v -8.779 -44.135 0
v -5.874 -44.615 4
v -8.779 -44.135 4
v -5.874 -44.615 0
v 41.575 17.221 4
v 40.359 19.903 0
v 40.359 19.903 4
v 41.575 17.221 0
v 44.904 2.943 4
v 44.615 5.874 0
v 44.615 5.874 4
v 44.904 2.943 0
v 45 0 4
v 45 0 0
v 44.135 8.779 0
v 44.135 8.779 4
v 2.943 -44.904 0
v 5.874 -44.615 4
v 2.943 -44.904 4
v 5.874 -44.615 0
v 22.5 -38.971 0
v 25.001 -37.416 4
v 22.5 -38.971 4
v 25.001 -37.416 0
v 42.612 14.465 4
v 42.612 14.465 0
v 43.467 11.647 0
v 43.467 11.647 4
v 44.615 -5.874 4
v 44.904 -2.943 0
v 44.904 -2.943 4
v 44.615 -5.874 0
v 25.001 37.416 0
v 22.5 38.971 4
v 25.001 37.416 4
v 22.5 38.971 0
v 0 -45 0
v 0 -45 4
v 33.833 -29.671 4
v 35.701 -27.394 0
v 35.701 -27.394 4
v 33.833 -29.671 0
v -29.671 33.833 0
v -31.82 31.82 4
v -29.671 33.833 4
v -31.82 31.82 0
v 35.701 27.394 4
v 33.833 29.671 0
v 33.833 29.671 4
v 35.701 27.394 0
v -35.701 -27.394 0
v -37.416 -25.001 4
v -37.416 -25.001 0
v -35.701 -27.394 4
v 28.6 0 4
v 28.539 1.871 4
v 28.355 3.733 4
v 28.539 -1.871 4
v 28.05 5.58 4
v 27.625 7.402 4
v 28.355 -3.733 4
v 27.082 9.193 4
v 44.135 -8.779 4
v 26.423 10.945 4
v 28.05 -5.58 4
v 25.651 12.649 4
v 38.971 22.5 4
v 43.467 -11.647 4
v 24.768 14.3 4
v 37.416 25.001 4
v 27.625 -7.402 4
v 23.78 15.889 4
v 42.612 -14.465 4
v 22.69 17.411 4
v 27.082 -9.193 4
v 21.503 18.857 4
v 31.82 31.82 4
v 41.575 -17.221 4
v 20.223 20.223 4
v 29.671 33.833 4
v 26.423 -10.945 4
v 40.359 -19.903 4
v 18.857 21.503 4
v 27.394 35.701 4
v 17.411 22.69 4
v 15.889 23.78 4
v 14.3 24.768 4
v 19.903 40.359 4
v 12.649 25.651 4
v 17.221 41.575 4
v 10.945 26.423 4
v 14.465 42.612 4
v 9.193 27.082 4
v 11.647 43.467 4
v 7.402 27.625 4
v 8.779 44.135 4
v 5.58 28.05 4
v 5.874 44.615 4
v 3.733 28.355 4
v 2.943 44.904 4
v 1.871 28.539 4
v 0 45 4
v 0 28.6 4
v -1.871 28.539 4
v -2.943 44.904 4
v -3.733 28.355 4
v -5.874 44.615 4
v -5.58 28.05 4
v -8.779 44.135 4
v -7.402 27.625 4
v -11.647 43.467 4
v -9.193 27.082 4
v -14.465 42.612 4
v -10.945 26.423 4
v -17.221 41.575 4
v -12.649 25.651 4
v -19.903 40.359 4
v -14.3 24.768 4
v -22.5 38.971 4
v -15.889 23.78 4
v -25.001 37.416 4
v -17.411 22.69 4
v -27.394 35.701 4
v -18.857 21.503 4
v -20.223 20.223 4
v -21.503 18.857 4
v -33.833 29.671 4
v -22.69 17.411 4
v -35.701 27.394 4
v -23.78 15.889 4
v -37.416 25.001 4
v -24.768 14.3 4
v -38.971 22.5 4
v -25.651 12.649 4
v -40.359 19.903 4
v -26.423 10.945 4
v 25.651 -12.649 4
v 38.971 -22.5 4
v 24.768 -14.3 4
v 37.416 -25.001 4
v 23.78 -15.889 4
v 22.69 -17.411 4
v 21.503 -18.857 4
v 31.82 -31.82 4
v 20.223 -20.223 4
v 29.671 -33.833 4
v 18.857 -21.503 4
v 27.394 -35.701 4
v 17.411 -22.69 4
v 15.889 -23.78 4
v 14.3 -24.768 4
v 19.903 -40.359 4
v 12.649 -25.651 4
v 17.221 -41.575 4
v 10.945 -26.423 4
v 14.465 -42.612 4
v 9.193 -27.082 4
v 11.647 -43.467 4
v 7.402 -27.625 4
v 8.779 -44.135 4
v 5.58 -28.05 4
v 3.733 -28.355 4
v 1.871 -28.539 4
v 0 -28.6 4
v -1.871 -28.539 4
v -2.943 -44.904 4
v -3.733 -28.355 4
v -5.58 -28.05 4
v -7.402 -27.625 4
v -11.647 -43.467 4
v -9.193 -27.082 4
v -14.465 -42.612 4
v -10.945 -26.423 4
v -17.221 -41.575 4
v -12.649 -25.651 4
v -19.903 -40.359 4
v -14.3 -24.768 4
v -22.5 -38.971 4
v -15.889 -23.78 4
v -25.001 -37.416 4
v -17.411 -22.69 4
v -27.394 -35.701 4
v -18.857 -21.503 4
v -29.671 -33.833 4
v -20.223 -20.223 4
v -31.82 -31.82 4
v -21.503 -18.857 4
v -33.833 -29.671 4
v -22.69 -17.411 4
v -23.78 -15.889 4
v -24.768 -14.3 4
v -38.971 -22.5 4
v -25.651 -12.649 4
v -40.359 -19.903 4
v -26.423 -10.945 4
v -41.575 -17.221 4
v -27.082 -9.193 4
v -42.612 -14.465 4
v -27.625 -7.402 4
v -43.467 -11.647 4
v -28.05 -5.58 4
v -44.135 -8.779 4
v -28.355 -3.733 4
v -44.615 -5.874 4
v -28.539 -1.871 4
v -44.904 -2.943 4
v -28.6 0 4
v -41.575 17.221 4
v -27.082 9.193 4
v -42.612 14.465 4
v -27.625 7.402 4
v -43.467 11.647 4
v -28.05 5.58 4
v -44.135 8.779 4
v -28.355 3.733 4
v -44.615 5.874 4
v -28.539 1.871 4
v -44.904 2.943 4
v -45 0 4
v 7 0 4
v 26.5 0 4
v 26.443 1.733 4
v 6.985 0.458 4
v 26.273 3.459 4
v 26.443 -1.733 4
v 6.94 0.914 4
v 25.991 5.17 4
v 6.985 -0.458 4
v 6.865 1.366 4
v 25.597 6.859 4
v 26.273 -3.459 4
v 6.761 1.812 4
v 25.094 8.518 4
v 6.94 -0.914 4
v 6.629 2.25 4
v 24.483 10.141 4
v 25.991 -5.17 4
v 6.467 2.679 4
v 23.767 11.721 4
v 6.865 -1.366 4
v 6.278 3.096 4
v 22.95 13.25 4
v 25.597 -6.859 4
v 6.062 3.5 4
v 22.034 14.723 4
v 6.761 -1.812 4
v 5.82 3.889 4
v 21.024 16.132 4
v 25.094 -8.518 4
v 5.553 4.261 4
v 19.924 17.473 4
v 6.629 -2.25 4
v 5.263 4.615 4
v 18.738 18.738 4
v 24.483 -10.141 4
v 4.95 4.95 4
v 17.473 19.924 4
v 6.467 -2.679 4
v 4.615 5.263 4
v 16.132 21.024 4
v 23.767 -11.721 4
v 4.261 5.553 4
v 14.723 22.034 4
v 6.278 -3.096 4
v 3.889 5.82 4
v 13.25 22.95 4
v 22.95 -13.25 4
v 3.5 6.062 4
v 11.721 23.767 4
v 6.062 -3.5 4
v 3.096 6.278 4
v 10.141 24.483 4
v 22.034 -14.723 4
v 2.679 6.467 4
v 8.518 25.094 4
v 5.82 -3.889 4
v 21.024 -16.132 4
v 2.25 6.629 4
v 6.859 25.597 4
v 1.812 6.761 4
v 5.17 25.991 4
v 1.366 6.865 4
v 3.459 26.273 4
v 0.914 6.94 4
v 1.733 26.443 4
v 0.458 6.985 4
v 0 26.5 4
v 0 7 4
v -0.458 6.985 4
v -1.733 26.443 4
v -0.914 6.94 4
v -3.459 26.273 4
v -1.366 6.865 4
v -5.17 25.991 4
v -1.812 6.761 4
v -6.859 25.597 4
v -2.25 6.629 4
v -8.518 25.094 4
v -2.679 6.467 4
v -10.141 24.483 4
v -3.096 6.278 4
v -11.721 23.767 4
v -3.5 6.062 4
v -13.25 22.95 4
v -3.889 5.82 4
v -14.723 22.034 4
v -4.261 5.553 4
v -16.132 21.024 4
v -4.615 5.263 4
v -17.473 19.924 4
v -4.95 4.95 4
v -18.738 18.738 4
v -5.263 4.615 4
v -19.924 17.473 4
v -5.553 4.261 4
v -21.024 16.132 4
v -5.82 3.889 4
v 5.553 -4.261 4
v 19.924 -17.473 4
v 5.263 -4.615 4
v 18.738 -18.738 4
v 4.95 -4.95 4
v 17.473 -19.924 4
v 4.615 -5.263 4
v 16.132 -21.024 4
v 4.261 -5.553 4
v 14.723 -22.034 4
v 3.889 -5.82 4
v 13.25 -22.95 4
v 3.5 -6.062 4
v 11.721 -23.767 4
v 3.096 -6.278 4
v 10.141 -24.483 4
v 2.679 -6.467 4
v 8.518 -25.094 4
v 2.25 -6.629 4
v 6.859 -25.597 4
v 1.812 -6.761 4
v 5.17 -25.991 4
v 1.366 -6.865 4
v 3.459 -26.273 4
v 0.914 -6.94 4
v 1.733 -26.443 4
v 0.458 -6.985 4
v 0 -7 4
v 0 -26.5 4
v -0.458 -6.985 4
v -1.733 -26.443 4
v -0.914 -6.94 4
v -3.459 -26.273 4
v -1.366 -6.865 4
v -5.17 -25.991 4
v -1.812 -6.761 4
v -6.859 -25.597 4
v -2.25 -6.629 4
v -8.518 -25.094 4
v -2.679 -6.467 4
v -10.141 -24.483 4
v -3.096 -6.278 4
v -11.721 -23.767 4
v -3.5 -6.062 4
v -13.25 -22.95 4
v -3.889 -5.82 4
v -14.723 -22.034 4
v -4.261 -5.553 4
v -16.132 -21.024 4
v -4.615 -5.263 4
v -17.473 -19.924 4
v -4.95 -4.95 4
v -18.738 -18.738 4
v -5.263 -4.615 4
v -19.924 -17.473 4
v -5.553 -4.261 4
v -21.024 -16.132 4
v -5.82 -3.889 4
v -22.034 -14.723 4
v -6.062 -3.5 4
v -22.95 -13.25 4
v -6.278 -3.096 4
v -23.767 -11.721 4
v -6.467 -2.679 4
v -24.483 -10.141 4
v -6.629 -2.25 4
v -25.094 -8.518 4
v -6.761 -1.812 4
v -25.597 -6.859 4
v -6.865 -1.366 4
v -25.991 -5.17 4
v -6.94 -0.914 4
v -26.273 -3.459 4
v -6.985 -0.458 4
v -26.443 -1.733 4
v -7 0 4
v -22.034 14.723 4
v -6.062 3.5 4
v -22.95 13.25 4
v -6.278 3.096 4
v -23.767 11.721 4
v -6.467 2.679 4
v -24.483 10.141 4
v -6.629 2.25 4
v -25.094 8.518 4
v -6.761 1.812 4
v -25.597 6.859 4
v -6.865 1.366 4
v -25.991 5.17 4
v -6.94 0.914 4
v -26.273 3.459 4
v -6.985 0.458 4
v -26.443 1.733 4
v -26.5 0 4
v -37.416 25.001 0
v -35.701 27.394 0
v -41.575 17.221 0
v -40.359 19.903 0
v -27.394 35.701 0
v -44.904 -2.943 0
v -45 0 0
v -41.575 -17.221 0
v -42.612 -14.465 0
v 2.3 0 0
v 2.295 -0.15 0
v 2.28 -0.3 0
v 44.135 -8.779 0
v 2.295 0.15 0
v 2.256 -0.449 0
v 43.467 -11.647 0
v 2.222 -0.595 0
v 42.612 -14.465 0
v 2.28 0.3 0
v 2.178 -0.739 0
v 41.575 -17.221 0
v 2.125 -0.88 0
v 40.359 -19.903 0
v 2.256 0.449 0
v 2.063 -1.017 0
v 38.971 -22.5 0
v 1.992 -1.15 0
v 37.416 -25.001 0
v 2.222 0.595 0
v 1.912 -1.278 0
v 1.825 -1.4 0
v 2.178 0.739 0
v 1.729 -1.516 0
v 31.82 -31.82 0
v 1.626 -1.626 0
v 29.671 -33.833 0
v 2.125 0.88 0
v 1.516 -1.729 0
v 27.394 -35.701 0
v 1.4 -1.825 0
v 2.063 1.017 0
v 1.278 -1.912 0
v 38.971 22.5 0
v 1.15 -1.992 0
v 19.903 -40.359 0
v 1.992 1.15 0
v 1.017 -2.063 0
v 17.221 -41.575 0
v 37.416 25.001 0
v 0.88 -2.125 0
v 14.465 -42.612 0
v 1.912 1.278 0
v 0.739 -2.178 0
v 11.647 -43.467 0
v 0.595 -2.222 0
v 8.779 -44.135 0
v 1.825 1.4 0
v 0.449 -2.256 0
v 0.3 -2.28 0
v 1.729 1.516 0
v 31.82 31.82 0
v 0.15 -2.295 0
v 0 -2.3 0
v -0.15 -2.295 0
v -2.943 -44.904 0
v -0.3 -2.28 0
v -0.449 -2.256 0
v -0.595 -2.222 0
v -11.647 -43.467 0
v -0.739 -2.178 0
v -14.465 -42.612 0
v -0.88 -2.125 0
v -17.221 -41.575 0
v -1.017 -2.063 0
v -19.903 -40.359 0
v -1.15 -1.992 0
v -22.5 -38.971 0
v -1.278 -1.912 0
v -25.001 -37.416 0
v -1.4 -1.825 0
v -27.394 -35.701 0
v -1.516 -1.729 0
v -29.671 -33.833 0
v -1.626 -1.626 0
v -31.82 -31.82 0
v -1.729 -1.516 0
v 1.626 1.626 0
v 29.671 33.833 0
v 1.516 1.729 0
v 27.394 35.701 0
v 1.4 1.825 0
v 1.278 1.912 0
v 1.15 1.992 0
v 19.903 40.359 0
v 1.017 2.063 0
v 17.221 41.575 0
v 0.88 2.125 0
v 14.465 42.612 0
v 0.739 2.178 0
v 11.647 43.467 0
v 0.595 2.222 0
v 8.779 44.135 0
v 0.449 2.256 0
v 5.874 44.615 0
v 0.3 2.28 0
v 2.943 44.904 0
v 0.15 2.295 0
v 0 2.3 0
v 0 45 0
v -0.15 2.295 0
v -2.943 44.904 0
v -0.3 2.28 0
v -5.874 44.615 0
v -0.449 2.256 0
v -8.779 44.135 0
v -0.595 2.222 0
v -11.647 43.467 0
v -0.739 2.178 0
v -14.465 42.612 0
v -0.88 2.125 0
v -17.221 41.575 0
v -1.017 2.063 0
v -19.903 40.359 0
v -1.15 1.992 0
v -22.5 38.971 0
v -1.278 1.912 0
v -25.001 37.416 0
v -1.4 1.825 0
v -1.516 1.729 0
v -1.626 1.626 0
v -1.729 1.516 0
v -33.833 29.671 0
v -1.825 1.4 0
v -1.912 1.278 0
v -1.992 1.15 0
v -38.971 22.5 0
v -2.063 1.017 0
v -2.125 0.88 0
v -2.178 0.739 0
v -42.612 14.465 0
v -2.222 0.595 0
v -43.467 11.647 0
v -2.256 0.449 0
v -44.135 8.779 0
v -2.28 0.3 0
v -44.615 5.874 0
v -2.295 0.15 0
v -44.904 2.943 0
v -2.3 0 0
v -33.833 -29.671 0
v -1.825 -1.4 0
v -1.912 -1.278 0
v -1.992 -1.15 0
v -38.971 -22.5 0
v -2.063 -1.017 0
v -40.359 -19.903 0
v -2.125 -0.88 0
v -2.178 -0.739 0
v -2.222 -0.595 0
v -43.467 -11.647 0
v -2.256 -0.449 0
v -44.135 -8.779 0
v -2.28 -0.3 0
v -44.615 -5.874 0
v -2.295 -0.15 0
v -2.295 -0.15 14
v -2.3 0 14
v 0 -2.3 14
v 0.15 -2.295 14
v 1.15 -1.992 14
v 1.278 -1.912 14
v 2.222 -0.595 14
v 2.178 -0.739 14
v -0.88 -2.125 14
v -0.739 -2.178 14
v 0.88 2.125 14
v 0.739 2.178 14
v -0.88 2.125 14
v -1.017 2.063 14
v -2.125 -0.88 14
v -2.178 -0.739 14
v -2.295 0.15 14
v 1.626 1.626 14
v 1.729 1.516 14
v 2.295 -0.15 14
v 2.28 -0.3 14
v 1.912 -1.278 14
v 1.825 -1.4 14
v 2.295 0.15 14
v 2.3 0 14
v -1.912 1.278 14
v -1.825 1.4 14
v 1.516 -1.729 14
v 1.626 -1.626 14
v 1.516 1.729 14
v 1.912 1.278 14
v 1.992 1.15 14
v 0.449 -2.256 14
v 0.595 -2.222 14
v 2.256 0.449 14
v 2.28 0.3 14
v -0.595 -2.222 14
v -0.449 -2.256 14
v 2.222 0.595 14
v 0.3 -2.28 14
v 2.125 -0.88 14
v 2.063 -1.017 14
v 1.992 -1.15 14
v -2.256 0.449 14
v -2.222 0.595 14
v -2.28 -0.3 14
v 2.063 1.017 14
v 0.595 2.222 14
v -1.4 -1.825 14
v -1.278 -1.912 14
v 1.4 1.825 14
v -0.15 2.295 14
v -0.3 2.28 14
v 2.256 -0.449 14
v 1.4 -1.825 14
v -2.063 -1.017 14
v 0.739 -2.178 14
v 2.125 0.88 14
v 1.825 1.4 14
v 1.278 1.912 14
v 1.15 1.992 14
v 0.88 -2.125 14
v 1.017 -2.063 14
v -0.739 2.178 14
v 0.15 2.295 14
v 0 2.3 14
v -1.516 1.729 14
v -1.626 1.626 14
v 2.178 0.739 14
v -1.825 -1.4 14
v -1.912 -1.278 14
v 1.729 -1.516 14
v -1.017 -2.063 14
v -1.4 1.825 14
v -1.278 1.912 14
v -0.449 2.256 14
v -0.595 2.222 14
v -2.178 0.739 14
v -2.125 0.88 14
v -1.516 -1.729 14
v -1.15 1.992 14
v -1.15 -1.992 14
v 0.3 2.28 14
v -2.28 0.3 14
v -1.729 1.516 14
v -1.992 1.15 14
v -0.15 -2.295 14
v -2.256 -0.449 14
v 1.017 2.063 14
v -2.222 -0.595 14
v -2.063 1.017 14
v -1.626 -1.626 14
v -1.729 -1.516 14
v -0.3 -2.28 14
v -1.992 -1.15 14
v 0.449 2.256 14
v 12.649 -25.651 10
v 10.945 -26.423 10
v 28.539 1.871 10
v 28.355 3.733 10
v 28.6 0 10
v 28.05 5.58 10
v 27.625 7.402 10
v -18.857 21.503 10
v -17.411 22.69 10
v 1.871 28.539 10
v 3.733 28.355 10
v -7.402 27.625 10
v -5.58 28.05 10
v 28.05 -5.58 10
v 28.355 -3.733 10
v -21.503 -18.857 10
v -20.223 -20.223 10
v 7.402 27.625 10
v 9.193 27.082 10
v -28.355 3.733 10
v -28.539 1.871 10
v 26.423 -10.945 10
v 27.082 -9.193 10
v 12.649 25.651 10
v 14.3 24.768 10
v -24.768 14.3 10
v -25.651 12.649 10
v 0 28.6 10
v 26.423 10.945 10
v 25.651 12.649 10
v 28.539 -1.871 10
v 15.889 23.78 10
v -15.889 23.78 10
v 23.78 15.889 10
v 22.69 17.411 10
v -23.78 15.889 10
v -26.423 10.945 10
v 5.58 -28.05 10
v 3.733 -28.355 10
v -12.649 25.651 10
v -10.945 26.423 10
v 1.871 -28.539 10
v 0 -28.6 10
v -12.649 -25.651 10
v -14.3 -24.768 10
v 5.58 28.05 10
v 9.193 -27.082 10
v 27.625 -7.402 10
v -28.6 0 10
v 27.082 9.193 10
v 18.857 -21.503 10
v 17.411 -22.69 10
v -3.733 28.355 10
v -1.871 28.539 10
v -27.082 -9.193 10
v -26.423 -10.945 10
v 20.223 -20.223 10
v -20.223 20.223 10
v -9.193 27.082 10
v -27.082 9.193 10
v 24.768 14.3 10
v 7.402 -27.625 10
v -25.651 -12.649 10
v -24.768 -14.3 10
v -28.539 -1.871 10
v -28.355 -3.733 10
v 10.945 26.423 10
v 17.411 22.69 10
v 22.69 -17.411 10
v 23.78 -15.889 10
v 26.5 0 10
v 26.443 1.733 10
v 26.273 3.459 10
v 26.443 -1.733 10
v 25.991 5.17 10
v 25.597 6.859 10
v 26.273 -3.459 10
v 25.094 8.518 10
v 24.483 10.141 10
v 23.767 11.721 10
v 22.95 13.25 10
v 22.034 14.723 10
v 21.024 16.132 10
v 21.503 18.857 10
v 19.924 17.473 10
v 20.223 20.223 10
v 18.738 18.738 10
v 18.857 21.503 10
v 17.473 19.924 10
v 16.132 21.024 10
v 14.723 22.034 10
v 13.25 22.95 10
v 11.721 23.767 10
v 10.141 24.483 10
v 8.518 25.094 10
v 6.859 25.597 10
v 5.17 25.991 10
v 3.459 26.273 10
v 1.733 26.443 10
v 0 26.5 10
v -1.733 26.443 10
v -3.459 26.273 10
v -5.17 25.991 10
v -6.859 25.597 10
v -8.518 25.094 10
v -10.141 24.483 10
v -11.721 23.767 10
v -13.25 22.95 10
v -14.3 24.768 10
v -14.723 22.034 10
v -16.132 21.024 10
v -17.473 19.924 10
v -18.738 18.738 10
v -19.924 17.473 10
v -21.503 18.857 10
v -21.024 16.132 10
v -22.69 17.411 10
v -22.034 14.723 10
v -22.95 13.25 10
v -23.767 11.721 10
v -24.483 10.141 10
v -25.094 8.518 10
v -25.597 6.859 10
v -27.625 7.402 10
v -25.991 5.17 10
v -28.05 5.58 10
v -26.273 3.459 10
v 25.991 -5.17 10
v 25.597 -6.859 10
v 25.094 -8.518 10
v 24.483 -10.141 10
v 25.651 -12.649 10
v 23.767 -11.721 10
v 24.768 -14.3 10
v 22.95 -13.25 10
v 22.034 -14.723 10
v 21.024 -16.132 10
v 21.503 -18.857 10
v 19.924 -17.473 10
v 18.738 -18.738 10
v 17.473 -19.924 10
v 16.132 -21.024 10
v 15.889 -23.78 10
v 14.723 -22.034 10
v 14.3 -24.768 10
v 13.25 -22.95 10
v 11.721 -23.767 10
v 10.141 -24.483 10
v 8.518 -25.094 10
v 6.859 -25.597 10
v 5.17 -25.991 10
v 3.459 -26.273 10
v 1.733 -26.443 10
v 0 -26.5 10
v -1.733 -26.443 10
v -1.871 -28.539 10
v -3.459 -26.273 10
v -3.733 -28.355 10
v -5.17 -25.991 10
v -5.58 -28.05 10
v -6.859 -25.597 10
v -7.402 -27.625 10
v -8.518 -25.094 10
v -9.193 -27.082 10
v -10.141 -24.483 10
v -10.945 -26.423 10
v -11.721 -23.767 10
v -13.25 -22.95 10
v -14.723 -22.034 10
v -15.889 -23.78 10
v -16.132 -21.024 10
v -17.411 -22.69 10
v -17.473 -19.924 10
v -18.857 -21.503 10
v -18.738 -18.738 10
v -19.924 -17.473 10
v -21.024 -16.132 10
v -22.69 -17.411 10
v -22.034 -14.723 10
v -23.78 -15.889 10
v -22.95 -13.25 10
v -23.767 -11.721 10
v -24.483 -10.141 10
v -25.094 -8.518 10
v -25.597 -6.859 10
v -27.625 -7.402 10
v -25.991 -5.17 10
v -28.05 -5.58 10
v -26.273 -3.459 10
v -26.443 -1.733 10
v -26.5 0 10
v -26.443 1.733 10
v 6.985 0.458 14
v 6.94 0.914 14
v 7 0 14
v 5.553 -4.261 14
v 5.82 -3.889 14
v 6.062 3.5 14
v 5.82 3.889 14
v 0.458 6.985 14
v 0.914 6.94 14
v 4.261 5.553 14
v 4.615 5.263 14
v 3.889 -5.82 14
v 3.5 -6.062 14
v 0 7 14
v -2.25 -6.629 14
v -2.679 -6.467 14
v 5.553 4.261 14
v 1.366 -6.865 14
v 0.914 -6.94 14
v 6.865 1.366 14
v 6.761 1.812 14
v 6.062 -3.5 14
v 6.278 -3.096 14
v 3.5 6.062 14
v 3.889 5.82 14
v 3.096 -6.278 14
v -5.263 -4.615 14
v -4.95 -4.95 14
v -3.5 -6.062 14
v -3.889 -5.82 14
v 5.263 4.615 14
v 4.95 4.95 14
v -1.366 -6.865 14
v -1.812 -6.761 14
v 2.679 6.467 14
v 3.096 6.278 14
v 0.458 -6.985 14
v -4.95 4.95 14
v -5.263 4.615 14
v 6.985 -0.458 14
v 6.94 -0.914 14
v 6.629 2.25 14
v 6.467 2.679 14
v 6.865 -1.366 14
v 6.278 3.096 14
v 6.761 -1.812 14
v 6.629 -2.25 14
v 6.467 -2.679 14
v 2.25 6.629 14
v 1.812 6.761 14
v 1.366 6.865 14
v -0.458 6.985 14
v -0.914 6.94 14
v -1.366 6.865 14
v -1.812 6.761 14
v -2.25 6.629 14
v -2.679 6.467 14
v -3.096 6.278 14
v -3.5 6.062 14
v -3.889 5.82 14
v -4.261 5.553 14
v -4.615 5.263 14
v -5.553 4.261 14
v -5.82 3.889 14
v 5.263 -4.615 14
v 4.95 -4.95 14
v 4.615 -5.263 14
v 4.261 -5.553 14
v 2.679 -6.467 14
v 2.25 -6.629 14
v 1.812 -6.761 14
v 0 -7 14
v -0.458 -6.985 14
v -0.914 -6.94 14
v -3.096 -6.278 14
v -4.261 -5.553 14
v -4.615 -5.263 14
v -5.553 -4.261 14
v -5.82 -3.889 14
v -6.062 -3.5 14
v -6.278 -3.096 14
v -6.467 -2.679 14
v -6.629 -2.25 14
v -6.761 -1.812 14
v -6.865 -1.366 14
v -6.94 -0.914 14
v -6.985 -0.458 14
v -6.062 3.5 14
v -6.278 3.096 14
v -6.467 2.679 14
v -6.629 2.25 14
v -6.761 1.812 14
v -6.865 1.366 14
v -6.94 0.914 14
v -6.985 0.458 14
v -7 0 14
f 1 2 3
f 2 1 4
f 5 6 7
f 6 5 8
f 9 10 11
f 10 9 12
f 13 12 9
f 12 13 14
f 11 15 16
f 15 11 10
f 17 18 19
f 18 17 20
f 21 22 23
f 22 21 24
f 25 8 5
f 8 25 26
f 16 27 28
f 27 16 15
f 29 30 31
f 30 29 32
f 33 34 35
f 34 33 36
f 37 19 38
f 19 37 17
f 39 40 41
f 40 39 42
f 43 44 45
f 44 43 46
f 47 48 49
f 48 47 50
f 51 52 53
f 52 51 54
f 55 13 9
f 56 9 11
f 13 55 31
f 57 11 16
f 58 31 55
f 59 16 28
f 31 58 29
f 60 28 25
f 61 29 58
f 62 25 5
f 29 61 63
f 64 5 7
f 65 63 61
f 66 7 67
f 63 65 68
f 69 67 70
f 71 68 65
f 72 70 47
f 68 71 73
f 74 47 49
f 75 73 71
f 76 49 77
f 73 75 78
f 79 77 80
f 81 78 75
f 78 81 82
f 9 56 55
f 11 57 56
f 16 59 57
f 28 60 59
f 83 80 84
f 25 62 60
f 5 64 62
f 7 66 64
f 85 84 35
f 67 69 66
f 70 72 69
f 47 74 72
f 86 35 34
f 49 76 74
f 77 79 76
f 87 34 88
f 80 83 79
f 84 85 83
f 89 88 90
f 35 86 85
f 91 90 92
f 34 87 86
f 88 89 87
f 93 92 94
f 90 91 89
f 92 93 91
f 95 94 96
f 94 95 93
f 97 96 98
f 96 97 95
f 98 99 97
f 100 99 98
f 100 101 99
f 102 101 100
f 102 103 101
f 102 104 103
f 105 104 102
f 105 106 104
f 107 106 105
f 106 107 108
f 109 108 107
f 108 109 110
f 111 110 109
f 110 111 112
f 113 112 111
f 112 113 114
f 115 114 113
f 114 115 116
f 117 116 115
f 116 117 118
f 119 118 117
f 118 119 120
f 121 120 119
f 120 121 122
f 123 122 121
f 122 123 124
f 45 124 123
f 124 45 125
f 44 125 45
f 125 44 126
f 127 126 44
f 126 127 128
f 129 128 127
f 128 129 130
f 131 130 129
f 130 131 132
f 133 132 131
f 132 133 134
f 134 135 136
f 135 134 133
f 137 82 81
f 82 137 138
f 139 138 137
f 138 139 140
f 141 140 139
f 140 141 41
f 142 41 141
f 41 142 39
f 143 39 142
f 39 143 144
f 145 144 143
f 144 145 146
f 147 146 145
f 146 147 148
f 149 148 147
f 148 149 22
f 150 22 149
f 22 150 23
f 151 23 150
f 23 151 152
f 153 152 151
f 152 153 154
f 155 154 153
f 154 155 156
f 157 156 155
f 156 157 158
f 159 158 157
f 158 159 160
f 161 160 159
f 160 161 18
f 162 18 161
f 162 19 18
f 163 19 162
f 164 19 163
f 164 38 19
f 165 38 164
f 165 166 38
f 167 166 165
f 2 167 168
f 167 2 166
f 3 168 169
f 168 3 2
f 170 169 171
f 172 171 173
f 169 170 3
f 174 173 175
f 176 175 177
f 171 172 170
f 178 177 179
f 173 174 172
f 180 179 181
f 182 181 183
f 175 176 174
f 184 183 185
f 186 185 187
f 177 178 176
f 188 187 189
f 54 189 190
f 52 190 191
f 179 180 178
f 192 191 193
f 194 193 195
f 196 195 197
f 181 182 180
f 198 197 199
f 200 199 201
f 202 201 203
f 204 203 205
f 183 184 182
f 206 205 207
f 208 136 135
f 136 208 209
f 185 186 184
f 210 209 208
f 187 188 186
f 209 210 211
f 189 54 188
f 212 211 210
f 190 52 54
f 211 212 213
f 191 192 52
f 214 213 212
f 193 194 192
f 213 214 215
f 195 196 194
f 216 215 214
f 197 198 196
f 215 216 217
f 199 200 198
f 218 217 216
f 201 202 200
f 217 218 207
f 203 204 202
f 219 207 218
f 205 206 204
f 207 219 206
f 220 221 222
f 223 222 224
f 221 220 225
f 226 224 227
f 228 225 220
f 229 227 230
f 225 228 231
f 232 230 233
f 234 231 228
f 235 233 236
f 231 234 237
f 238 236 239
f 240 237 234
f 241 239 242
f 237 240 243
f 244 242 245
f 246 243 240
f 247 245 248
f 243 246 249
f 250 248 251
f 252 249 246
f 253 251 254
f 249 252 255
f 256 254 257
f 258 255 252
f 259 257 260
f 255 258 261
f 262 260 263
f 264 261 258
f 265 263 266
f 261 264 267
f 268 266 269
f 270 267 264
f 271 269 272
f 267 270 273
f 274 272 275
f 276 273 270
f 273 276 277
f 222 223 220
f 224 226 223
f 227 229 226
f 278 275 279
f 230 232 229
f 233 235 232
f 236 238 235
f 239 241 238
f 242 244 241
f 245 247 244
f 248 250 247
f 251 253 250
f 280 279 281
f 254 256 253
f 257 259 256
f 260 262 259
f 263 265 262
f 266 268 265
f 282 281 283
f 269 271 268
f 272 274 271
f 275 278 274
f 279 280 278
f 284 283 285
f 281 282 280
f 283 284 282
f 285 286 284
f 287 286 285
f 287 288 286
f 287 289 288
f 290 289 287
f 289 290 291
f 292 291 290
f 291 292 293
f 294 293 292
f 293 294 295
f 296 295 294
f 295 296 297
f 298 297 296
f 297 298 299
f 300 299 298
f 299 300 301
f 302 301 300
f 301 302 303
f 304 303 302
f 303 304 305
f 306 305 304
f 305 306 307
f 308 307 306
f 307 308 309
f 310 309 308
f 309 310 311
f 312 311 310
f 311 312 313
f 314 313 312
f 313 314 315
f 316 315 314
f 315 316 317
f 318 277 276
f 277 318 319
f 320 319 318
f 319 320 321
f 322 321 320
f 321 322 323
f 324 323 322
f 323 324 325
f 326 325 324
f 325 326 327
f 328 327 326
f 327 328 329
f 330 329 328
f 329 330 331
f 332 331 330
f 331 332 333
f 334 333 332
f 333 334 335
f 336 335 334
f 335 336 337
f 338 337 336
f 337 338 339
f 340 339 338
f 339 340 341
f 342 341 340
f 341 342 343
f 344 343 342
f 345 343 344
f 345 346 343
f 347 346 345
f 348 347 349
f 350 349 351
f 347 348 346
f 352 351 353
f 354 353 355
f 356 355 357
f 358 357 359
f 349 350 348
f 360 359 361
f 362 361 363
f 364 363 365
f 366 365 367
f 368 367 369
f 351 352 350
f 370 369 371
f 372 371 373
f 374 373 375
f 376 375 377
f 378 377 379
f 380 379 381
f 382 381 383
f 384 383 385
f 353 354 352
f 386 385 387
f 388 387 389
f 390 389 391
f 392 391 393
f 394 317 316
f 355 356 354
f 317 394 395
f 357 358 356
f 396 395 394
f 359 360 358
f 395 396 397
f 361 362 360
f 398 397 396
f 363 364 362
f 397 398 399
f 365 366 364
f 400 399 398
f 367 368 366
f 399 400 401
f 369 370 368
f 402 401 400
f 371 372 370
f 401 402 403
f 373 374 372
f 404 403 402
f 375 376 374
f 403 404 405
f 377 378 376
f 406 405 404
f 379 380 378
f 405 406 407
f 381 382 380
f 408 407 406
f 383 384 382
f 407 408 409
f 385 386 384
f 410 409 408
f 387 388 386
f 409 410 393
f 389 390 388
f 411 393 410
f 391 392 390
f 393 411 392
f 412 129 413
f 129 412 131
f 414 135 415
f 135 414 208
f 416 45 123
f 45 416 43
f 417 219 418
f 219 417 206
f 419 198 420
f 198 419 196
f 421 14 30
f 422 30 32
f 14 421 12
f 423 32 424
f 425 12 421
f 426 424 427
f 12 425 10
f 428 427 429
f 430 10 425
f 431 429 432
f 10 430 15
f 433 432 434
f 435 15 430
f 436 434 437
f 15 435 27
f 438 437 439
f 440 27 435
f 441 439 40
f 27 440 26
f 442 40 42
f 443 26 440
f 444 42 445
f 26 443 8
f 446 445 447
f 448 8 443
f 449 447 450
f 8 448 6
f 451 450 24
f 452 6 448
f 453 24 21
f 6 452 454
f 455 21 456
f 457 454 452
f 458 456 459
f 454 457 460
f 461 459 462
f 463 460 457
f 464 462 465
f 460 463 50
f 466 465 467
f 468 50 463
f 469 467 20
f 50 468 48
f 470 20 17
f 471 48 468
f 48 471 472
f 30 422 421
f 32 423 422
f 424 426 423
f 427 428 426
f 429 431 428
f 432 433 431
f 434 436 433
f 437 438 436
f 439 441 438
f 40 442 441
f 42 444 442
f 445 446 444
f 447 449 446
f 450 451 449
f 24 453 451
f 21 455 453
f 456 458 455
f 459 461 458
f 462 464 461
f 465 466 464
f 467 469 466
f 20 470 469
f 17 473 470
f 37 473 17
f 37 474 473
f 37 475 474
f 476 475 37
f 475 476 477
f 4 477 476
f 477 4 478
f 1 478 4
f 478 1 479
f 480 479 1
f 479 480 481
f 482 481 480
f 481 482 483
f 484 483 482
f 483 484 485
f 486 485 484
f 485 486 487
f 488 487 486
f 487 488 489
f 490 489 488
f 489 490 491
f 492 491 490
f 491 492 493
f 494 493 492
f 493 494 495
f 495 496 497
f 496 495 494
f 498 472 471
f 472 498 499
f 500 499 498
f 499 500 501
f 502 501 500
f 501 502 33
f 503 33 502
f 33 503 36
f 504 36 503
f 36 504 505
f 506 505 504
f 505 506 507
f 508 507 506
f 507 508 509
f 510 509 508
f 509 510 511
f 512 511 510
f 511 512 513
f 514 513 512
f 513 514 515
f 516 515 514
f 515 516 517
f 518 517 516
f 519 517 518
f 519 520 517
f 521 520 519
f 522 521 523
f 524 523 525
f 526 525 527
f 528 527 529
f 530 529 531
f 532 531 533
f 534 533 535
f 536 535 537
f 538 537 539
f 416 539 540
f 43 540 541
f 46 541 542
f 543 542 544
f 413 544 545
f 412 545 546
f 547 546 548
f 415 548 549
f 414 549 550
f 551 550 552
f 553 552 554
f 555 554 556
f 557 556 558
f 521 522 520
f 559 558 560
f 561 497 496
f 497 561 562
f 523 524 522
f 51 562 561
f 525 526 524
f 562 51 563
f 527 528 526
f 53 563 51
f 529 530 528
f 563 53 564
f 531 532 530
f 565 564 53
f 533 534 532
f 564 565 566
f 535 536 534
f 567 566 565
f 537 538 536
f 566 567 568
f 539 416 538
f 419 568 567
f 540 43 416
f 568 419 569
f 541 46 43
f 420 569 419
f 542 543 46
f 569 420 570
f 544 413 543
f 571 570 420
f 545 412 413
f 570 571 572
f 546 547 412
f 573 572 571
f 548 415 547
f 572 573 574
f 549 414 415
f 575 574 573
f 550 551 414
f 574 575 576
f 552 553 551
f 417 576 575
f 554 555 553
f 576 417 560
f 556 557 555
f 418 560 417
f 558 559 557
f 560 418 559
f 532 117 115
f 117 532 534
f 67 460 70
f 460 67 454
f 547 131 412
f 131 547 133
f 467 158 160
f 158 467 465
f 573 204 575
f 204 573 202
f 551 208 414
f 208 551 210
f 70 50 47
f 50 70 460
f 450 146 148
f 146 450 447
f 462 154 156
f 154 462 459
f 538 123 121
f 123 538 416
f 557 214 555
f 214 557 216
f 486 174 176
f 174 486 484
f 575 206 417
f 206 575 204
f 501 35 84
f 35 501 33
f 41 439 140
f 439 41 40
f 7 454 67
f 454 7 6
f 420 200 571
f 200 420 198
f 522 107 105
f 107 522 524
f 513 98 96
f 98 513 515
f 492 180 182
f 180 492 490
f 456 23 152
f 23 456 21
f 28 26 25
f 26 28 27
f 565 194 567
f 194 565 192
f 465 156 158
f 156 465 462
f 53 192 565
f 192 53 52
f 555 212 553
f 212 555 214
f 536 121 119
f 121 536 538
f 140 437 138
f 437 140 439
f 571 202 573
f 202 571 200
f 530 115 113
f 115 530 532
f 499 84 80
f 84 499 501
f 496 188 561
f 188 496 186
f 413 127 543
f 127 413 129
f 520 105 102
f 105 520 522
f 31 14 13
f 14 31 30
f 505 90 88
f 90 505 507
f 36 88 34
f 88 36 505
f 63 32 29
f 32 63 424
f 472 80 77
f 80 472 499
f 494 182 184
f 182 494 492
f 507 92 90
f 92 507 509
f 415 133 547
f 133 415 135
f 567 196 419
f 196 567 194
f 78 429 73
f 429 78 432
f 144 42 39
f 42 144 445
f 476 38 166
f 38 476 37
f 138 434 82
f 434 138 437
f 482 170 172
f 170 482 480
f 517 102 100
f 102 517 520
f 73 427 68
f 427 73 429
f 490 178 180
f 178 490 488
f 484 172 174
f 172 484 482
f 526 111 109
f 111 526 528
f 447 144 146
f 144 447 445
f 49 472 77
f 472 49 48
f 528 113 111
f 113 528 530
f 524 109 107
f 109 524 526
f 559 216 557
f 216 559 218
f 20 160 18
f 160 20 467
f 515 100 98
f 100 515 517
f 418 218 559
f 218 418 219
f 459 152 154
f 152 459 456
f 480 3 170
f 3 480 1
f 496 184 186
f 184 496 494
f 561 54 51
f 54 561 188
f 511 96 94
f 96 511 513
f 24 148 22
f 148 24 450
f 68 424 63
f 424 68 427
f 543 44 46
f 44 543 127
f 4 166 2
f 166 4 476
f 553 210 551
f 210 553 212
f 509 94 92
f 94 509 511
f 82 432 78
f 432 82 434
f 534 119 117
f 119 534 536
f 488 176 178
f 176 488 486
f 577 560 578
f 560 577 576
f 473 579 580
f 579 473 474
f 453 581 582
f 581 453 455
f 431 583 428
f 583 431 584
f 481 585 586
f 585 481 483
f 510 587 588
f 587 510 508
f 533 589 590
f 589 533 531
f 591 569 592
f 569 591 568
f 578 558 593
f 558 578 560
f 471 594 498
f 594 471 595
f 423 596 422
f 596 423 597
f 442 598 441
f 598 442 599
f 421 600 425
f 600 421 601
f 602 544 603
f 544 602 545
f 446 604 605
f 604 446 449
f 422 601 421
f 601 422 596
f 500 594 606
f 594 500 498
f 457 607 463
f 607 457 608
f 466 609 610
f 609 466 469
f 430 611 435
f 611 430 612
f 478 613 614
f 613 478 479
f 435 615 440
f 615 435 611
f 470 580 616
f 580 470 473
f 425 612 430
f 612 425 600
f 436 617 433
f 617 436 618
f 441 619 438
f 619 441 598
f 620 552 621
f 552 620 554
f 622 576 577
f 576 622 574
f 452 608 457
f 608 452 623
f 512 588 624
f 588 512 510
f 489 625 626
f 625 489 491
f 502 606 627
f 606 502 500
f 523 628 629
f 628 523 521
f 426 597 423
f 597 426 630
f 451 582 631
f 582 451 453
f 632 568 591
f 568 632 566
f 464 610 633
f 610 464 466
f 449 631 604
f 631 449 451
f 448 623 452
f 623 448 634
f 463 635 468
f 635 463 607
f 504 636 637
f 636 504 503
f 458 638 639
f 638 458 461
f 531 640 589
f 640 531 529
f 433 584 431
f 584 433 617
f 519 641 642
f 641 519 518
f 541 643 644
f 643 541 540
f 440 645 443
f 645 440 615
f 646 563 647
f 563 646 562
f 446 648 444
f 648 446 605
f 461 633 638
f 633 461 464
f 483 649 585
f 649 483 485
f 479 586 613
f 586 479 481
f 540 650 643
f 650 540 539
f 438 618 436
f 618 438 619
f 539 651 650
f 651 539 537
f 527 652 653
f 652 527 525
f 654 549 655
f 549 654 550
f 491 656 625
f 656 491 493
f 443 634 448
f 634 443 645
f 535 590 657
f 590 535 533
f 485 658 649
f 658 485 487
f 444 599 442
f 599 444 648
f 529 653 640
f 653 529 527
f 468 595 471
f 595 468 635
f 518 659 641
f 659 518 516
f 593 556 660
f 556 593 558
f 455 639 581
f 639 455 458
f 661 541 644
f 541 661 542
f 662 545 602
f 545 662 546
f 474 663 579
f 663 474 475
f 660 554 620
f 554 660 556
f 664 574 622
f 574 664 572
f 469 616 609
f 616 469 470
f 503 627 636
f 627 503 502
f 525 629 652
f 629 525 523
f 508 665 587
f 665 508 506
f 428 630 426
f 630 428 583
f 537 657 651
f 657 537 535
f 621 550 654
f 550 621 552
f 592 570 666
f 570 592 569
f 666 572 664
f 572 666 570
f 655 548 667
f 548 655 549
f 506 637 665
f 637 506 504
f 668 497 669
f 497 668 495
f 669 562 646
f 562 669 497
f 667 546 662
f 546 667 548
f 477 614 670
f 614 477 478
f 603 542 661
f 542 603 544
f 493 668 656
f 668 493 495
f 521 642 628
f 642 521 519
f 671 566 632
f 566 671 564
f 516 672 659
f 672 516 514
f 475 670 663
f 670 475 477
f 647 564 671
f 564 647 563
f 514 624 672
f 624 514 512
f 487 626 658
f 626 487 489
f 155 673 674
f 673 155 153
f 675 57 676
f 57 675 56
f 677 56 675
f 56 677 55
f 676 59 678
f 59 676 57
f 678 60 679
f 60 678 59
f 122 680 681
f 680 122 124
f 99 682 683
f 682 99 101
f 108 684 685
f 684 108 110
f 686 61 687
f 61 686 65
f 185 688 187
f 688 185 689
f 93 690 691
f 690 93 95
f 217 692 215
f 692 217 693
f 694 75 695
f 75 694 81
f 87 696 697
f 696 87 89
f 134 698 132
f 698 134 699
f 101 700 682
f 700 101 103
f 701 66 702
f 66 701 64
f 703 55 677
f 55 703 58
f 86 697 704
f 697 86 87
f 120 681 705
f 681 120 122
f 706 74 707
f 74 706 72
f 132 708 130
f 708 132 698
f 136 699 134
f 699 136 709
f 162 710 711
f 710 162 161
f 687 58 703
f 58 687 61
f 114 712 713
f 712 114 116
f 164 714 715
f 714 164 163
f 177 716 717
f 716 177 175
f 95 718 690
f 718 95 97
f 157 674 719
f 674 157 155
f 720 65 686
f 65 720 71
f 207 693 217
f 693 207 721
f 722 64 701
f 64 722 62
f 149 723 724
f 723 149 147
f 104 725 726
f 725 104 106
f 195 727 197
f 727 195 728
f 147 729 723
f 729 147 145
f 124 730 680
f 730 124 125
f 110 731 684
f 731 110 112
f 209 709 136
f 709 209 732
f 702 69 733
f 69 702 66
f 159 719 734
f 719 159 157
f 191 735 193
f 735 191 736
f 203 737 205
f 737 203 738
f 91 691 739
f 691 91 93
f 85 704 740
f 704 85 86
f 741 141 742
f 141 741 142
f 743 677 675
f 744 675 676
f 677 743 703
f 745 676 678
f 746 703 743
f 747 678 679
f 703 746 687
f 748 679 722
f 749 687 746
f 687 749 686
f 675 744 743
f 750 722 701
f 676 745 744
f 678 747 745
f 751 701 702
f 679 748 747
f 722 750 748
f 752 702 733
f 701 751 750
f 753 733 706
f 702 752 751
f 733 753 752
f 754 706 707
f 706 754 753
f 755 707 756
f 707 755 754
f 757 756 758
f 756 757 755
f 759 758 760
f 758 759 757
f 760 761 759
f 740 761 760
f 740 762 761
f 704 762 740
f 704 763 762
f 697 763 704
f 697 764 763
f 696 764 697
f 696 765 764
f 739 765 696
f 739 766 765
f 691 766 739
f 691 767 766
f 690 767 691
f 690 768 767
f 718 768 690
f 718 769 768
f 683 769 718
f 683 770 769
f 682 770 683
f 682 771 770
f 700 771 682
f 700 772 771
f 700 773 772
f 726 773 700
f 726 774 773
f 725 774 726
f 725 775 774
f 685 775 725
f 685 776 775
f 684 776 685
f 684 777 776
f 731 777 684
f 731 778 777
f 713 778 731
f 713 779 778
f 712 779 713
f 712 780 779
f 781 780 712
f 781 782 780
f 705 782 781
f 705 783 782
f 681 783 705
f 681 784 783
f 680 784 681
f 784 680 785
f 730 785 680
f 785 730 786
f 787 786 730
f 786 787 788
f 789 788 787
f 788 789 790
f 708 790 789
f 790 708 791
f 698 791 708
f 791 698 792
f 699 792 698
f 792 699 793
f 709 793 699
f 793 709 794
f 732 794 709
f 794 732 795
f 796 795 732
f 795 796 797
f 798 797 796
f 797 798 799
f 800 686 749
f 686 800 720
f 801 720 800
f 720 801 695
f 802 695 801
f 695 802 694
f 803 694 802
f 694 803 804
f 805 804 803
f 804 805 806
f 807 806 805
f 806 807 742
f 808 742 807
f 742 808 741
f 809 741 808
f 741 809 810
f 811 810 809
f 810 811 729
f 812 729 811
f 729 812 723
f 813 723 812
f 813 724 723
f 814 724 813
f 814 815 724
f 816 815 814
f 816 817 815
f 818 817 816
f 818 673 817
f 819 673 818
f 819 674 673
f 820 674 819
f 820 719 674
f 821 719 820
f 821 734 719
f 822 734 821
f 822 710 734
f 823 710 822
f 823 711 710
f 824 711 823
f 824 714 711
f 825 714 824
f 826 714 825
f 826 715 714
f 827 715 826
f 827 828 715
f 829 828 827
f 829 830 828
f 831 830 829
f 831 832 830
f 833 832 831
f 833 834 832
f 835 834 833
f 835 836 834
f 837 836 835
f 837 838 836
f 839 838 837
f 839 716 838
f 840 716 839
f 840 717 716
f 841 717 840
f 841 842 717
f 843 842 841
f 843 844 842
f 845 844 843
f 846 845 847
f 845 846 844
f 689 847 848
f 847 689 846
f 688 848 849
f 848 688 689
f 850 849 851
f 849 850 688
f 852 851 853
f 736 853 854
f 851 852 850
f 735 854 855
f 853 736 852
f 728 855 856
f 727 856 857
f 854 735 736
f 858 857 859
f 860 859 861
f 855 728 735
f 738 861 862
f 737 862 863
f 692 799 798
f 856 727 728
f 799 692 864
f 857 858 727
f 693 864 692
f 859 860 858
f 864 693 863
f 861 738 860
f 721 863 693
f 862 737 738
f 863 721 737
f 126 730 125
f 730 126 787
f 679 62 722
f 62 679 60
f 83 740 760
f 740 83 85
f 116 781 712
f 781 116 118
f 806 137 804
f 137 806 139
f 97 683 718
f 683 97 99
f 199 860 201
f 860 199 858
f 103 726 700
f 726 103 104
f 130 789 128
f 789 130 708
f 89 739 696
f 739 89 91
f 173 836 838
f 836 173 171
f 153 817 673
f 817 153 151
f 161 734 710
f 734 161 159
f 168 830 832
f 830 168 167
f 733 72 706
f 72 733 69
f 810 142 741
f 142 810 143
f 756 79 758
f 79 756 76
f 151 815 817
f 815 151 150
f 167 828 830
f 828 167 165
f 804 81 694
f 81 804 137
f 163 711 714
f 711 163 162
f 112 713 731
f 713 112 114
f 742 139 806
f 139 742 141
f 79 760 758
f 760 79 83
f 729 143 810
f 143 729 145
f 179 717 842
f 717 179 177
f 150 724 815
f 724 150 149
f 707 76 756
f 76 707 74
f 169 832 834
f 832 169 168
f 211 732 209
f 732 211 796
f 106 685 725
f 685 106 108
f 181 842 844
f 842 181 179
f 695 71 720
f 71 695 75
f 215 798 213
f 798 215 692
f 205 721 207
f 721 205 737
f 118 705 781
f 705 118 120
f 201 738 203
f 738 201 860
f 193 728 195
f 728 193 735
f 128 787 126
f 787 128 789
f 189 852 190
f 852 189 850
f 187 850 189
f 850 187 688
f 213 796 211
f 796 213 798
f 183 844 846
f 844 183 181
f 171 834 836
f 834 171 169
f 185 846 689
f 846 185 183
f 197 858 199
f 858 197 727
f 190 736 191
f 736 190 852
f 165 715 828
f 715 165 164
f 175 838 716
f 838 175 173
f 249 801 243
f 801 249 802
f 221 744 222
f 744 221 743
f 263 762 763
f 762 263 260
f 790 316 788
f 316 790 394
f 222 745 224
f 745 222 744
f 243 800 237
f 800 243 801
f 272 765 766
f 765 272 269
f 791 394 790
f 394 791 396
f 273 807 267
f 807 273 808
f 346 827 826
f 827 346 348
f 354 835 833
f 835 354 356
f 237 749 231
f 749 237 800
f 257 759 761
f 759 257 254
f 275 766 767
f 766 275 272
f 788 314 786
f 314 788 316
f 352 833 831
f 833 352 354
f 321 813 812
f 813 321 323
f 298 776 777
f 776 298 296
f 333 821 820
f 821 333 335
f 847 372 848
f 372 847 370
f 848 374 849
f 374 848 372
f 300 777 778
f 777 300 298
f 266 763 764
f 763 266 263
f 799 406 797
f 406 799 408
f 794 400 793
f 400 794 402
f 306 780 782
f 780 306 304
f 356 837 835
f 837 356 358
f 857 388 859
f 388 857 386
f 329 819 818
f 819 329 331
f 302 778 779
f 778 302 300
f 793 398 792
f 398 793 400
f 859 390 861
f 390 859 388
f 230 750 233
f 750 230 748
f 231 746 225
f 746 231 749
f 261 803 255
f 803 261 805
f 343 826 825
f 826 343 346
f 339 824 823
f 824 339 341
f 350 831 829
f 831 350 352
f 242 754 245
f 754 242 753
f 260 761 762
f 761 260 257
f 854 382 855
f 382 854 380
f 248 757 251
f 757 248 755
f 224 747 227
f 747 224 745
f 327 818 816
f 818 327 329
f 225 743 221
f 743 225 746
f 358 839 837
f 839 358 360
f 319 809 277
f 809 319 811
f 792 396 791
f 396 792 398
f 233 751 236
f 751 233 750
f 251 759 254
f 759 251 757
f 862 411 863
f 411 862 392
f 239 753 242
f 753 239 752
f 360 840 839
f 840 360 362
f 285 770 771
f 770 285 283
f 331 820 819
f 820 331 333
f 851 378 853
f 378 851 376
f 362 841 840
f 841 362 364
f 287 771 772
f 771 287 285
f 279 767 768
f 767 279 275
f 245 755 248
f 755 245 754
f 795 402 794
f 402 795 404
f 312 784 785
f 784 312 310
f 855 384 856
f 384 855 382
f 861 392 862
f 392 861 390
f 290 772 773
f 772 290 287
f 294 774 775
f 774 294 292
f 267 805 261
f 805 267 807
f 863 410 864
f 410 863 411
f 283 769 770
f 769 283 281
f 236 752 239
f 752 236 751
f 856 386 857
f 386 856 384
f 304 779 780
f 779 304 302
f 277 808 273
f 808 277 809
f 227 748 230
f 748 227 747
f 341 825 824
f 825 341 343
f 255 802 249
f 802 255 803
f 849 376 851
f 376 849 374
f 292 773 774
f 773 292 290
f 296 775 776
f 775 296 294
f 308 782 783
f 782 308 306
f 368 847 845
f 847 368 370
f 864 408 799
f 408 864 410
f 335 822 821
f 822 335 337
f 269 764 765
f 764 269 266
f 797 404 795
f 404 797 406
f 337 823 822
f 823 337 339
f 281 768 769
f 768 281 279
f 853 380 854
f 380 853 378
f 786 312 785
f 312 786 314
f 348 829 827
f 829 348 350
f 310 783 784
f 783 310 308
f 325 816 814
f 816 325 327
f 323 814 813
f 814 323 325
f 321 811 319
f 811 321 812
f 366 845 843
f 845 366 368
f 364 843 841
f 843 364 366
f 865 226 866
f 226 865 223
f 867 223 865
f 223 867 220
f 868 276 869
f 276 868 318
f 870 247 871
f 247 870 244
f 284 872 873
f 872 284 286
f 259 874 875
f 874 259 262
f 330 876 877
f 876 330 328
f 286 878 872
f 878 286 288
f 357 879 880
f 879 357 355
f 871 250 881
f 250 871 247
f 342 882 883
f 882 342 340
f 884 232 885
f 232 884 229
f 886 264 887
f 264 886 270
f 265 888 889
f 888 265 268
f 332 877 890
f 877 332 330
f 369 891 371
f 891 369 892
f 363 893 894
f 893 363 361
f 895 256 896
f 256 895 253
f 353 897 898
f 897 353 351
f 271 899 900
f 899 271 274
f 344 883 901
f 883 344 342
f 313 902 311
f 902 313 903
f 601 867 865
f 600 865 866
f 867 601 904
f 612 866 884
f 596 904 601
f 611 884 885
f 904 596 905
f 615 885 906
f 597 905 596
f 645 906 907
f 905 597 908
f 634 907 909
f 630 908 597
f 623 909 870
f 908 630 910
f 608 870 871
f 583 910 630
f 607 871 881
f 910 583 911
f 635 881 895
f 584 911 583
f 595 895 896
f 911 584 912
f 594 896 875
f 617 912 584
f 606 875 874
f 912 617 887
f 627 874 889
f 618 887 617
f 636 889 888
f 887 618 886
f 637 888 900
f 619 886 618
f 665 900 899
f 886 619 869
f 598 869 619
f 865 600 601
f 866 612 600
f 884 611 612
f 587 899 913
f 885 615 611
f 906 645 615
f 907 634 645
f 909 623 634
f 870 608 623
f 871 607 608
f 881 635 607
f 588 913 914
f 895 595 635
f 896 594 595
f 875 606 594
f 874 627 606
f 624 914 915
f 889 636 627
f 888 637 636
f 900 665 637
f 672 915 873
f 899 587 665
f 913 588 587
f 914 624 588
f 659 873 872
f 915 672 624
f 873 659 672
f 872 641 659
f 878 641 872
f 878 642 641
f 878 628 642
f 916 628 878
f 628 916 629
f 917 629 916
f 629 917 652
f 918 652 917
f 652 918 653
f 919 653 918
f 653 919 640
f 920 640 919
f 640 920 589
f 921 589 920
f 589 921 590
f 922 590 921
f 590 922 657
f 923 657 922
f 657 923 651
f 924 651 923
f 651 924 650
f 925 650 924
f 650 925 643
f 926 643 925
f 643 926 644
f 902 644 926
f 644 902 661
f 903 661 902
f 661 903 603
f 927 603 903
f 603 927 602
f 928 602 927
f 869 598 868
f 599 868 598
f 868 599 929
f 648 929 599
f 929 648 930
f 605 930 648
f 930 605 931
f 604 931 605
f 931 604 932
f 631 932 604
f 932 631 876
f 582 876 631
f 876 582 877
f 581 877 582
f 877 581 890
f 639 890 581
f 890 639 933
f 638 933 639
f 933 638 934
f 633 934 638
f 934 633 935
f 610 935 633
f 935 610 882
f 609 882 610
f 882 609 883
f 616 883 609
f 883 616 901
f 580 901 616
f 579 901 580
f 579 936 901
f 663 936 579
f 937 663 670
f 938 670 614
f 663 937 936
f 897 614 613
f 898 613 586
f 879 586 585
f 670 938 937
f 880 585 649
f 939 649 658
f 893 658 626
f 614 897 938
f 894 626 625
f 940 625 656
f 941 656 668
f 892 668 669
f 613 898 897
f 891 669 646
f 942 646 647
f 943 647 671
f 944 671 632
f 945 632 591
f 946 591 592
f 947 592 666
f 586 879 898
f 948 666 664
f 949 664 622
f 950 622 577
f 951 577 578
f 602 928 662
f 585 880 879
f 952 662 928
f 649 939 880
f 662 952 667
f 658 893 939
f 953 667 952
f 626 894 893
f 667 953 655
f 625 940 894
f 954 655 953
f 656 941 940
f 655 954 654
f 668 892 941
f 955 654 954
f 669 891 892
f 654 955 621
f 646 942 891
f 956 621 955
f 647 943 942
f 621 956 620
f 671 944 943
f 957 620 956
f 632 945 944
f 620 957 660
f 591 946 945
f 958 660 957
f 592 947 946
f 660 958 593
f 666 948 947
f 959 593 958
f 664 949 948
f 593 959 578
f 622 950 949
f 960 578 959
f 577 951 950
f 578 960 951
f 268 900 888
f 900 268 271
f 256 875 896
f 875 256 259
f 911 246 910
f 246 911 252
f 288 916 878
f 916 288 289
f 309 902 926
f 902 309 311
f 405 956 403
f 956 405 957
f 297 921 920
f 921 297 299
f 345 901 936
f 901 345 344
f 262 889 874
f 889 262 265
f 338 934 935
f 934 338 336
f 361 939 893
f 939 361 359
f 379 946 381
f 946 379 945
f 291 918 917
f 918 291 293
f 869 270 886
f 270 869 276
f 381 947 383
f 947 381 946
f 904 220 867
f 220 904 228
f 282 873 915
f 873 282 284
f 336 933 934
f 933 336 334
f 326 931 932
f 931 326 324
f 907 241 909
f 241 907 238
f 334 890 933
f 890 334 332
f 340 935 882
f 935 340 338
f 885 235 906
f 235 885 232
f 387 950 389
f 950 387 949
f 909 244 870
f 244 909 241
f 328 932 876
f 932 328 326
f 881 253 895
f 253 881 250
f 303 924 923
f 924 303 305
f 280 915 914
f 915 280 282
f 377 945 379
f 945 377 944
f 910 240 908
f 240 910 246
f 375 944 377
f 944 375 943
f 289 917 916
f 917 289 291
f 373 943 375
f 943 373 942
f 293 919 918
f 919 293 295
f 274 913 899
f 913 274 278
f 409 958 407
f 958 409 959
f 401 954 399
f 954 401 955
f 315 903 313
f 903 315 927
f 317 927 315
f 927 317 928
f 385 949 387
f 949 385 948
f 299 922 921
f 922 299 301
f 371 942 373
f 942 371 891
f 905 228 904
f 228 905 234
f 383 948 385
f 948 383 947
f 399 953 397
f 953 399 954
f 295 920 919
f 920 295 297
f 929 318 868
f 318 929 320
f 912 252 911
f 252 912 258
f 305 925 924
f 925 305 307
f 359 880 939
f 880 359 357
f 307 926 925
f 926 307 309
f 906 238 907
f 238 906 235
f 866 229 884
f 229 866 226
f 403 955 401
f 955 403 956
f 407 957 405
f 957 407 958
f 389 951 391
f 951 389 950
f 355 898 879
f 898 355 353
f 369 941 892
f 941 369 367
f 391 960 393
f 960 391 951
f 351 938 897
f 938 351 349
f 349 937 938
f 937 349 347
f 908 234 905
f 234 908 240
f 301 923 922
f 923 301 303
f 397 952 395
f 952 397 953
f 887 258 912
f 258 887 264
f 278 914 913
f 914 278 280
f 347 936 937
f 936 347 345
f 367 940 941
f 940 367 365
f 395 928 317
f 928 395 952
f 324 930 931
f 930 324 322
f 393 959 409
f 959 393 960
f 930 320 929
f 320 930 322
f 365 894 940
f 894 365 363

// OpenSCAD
// Idea 4 tabletop "well" rig - editable OpenSCAD version of the parts in this folder.
// The ready-to-print STL files were made by data/ideas/4/cad/make_parts.py with the same numbers.
// Use this file only if you want to change a size. Free program: https://openscad.org
//
// How to use:
//   1. Measure your motor, servo, rod and jar with calipers. Change the numbers below.
//   2. Set PART to the part you want. Press F6 (render), then File > Export > STL.
//
// All sizes are in millimetres.

PART = "wellhead_plate";  // wellhead_plate | drive_head | coupling_motor_side | coupling_rod_side | brake_drum
                        // brake_pad | paddle_rotor | pcp_rotor | pcp_stator_cutaway

rod_d        = 4.0;   // wooden dowel or steel rod ("rod string")
rod_clear    = 0.6;   // extra diameter where the rod must turn freely
rod_press    = 0.2;   // extra diameter where the rod is glued or pressed in
jar_inner_d  = 58.0;  // inside diameter of the jar mouth ("wellbore")
lid_d        = 90.0;  // lid diameter, must be wider than the jar rim
motor_w      = 20.4;  // DC motor can, long flat-to-flat
motor_t      = 15.2;  // DC motor can, short flat-to-flat
motor_boss_d = 6.6;   // round boss around the motor shaft
motor_shaft_d= 2.0;
servo_l      = 22.8;  // SG90 body length
servo_w      = 12.4;  // SG90 body width
magnet_d     = 6.0;   // optional 6 x 3 mm disc magnets
magnet_t     = 3.0;
pcp_r        = 6.0;   // PCP rotor section radius
pcp_e        = 2.0;   // PCP eccentricity
pcp_pitch    = 40.0;  // rotor pitch; stator pitch is 2 x this
pcp_len      = 120.0;
pcp_clear    = 0.45;

$fn = 96;
rc = (rod_d + rod_clear) / 2;
rp = (rod_d + rod_press) / 2;

module tube(ri, ro, h) { difference() { cylinder(r = ro, h = h); translate([0, 0, -1]) cylinder(r = ri, h = h + 2); } }

servo_y  = -31;   // servo cradle centre; move closer (e.g. -28) if the horn + pad cannot reach the drum
pillar_h = 69;    // keeps the coupling above the servo horn / brake drum

// Print flat side down, then flip: the lip and boss go down into the jar mouth. No supports.
module wellhead_plate() {
    tube(rc, lid_d / 2, 4);                                                // plate with rod hole
    translate([0, 0, 3.5]) tube(jar_inner_d / 2 - 2.5, jar_inner_d / 2 - 0.4, 6.5); // centring lip
    translate([0, 0, 3.5]) tube(rc, 7, 10.5);                              // guide boss ("stuffing box")
}

// Glue or screw onto the plate. Pillars carry the motor; the cradle holds the SG90 standing shaft-up.
module drive_head() {
    for (x = [-20, 20]) translate([x - 7, -7, 0]) cube([14, 14, 3]);      // pillar feet
    translate([-27, -11, 0]) cube([54, 3, 3]);                             // cross bar (clear of the rod)
    translate([-6, servo_y + servo_w / 2, 0]) cube([12, -8 - (servo_y + servo_w / 2), 3]); // spine
    translate([-servo_l / 2 - 2, servo_y - servo_w / 2 - 2, 0]) cube([servo_l + 4, servo_w + 4, 3]); // cradle floor
    for (x = [-20, 20]) translate([x - 4, -5, 0]) cube([8, 10, pillar_h]); // pillars
    translate([0, 0, pillar_h - 4]) difference() {                         // bridge with motor-boss hole
        translate([-24, -9, 0]) cube([48, 18, 4]);
        translate([0, 0, -1]) cylinder(r = motor_boss_d / 2, h = 6);
    }
    translate([0, 0, pillar_h - 0.5]) difference() {                       // motor pocket
        translate([-motor_w / 2 - 2, -motor_t / 2 - 2, 0]) cube([motor_w + 4, motor_t + 4, 12.5]);
        translate([-motor_w / 2, -motor_t / 2, -1]) cube([motor_w, motor_t, 15]);
    }
    translate([0, servo_y, 2.5]) difference() {                            // servo cradle walls
        translate([-servo_l / 2 - 2, -servo_w / 2 - 2, 0]) cube([servo_l + 4, servo_w + 4, 16]);
        translate([-servo_l / 2, -servo_w / 2, -1]) cube([servo_l, servo_w, 20]);
    }
}

// Printed face-up (dogs up, no supports). In use the motor-side half is turned over.
module coupling(motor_side) {
    bore_r = motor_side ? (motor_shaft_d - 0.1) / 2 : rp;
    difference() {
        cylinder(r = 8, h = 10);
        translate([0, 0, -1]) cylinder(r = bore_r, h = 7);                   // shaft / rod bore from the bottom
        translate([0, 0, 10 - magnet_t - 0.2]) cylinder(r = (magnet_d + 0.3) / 2, h = magnet_t + 1); // magnet pocket
    }
    for (k = [0 : 2]) rotate([0, 0, (motor_side ? 0 : 60) + 120 * k])     // three dogs on the face
        translate([3.8, -1.9, 9.8]) cube([4.2, 3.8, 3.2]);
}

module brake_drum() { tube(rp, 12, 6); }

module brake_pad() { translate([-5, 0, 0]) cube([10, 4, 7]); translate([-2, -6, 0]) cube([4, 6.5, 3]); }

module paddle_rotor() {
    difference() { cylinder(r = 5.5, h = 16); translate([0, 0, 4]) cylinder(r = rp, h = 13); }
    for (k = [0 : 3]) rotate([0, 0, 90 * k]) translate([4.5, -0.9, 0]) cube([16.5, 1.8, 13]);
}

module pcp_rotor() {
    difference() {
        linear_extrude(height = pcp_len, twist = -360 * pcp_len / pcp_pitch, slices = pcp_len * 2)
            translate([pcp_e, 0]) circle(r = pcp_r);
        translate([0, 0, pcp_len - 10]) cylinder(r = rp, h = 11);         // socket for the rod
    }
}

module pcp_stator_cutaway(R = 14, window = 90) {
    difference() {
        cylinder(r = R, h = pcp_len);
        translate([0, 0, -1])
            linear_extrude(height = pcp_len + 2, twist = -360 * (pcp_len + 2) / (2 * pcp_pitch), slices = pcp_len * 2)
                hull() for (x = [-2 * pcp_e, 2 * pcp_e]) translate([x, 0]) circle(r = pcp_r + pcp_clear);
        // open window so you can see the cavities
        translate([0, 0, -1]) linear_extrude(pcp_len + 2)
            polygon([[0, 0], [2 * R * cos(window / 2), 2 * R * sin(window / 2)], [2 * R, 0],
                     [2 * R * cos(-window / 2), 2 * R * sin(-window / 2)]]);
    }
}

if (PART == "wellhead_plate") wellhead_plate();
if (PART == "drive_head") drive_head();
if (PART == "coupling_motor_side") coupling(true);
if (PART == "coupling_rod_side") coupling(false);
if (PART == "brake_drum") brake_drum();
if (PART == "brake_pad") brake_pad();
if (PART == "paddle_rotor") paddle_rotor();
if (PART == "pcp_rotor") pcp_rotor();
if (PART == "pcp_stator_cutaway") pcp_stator_cutaway();
